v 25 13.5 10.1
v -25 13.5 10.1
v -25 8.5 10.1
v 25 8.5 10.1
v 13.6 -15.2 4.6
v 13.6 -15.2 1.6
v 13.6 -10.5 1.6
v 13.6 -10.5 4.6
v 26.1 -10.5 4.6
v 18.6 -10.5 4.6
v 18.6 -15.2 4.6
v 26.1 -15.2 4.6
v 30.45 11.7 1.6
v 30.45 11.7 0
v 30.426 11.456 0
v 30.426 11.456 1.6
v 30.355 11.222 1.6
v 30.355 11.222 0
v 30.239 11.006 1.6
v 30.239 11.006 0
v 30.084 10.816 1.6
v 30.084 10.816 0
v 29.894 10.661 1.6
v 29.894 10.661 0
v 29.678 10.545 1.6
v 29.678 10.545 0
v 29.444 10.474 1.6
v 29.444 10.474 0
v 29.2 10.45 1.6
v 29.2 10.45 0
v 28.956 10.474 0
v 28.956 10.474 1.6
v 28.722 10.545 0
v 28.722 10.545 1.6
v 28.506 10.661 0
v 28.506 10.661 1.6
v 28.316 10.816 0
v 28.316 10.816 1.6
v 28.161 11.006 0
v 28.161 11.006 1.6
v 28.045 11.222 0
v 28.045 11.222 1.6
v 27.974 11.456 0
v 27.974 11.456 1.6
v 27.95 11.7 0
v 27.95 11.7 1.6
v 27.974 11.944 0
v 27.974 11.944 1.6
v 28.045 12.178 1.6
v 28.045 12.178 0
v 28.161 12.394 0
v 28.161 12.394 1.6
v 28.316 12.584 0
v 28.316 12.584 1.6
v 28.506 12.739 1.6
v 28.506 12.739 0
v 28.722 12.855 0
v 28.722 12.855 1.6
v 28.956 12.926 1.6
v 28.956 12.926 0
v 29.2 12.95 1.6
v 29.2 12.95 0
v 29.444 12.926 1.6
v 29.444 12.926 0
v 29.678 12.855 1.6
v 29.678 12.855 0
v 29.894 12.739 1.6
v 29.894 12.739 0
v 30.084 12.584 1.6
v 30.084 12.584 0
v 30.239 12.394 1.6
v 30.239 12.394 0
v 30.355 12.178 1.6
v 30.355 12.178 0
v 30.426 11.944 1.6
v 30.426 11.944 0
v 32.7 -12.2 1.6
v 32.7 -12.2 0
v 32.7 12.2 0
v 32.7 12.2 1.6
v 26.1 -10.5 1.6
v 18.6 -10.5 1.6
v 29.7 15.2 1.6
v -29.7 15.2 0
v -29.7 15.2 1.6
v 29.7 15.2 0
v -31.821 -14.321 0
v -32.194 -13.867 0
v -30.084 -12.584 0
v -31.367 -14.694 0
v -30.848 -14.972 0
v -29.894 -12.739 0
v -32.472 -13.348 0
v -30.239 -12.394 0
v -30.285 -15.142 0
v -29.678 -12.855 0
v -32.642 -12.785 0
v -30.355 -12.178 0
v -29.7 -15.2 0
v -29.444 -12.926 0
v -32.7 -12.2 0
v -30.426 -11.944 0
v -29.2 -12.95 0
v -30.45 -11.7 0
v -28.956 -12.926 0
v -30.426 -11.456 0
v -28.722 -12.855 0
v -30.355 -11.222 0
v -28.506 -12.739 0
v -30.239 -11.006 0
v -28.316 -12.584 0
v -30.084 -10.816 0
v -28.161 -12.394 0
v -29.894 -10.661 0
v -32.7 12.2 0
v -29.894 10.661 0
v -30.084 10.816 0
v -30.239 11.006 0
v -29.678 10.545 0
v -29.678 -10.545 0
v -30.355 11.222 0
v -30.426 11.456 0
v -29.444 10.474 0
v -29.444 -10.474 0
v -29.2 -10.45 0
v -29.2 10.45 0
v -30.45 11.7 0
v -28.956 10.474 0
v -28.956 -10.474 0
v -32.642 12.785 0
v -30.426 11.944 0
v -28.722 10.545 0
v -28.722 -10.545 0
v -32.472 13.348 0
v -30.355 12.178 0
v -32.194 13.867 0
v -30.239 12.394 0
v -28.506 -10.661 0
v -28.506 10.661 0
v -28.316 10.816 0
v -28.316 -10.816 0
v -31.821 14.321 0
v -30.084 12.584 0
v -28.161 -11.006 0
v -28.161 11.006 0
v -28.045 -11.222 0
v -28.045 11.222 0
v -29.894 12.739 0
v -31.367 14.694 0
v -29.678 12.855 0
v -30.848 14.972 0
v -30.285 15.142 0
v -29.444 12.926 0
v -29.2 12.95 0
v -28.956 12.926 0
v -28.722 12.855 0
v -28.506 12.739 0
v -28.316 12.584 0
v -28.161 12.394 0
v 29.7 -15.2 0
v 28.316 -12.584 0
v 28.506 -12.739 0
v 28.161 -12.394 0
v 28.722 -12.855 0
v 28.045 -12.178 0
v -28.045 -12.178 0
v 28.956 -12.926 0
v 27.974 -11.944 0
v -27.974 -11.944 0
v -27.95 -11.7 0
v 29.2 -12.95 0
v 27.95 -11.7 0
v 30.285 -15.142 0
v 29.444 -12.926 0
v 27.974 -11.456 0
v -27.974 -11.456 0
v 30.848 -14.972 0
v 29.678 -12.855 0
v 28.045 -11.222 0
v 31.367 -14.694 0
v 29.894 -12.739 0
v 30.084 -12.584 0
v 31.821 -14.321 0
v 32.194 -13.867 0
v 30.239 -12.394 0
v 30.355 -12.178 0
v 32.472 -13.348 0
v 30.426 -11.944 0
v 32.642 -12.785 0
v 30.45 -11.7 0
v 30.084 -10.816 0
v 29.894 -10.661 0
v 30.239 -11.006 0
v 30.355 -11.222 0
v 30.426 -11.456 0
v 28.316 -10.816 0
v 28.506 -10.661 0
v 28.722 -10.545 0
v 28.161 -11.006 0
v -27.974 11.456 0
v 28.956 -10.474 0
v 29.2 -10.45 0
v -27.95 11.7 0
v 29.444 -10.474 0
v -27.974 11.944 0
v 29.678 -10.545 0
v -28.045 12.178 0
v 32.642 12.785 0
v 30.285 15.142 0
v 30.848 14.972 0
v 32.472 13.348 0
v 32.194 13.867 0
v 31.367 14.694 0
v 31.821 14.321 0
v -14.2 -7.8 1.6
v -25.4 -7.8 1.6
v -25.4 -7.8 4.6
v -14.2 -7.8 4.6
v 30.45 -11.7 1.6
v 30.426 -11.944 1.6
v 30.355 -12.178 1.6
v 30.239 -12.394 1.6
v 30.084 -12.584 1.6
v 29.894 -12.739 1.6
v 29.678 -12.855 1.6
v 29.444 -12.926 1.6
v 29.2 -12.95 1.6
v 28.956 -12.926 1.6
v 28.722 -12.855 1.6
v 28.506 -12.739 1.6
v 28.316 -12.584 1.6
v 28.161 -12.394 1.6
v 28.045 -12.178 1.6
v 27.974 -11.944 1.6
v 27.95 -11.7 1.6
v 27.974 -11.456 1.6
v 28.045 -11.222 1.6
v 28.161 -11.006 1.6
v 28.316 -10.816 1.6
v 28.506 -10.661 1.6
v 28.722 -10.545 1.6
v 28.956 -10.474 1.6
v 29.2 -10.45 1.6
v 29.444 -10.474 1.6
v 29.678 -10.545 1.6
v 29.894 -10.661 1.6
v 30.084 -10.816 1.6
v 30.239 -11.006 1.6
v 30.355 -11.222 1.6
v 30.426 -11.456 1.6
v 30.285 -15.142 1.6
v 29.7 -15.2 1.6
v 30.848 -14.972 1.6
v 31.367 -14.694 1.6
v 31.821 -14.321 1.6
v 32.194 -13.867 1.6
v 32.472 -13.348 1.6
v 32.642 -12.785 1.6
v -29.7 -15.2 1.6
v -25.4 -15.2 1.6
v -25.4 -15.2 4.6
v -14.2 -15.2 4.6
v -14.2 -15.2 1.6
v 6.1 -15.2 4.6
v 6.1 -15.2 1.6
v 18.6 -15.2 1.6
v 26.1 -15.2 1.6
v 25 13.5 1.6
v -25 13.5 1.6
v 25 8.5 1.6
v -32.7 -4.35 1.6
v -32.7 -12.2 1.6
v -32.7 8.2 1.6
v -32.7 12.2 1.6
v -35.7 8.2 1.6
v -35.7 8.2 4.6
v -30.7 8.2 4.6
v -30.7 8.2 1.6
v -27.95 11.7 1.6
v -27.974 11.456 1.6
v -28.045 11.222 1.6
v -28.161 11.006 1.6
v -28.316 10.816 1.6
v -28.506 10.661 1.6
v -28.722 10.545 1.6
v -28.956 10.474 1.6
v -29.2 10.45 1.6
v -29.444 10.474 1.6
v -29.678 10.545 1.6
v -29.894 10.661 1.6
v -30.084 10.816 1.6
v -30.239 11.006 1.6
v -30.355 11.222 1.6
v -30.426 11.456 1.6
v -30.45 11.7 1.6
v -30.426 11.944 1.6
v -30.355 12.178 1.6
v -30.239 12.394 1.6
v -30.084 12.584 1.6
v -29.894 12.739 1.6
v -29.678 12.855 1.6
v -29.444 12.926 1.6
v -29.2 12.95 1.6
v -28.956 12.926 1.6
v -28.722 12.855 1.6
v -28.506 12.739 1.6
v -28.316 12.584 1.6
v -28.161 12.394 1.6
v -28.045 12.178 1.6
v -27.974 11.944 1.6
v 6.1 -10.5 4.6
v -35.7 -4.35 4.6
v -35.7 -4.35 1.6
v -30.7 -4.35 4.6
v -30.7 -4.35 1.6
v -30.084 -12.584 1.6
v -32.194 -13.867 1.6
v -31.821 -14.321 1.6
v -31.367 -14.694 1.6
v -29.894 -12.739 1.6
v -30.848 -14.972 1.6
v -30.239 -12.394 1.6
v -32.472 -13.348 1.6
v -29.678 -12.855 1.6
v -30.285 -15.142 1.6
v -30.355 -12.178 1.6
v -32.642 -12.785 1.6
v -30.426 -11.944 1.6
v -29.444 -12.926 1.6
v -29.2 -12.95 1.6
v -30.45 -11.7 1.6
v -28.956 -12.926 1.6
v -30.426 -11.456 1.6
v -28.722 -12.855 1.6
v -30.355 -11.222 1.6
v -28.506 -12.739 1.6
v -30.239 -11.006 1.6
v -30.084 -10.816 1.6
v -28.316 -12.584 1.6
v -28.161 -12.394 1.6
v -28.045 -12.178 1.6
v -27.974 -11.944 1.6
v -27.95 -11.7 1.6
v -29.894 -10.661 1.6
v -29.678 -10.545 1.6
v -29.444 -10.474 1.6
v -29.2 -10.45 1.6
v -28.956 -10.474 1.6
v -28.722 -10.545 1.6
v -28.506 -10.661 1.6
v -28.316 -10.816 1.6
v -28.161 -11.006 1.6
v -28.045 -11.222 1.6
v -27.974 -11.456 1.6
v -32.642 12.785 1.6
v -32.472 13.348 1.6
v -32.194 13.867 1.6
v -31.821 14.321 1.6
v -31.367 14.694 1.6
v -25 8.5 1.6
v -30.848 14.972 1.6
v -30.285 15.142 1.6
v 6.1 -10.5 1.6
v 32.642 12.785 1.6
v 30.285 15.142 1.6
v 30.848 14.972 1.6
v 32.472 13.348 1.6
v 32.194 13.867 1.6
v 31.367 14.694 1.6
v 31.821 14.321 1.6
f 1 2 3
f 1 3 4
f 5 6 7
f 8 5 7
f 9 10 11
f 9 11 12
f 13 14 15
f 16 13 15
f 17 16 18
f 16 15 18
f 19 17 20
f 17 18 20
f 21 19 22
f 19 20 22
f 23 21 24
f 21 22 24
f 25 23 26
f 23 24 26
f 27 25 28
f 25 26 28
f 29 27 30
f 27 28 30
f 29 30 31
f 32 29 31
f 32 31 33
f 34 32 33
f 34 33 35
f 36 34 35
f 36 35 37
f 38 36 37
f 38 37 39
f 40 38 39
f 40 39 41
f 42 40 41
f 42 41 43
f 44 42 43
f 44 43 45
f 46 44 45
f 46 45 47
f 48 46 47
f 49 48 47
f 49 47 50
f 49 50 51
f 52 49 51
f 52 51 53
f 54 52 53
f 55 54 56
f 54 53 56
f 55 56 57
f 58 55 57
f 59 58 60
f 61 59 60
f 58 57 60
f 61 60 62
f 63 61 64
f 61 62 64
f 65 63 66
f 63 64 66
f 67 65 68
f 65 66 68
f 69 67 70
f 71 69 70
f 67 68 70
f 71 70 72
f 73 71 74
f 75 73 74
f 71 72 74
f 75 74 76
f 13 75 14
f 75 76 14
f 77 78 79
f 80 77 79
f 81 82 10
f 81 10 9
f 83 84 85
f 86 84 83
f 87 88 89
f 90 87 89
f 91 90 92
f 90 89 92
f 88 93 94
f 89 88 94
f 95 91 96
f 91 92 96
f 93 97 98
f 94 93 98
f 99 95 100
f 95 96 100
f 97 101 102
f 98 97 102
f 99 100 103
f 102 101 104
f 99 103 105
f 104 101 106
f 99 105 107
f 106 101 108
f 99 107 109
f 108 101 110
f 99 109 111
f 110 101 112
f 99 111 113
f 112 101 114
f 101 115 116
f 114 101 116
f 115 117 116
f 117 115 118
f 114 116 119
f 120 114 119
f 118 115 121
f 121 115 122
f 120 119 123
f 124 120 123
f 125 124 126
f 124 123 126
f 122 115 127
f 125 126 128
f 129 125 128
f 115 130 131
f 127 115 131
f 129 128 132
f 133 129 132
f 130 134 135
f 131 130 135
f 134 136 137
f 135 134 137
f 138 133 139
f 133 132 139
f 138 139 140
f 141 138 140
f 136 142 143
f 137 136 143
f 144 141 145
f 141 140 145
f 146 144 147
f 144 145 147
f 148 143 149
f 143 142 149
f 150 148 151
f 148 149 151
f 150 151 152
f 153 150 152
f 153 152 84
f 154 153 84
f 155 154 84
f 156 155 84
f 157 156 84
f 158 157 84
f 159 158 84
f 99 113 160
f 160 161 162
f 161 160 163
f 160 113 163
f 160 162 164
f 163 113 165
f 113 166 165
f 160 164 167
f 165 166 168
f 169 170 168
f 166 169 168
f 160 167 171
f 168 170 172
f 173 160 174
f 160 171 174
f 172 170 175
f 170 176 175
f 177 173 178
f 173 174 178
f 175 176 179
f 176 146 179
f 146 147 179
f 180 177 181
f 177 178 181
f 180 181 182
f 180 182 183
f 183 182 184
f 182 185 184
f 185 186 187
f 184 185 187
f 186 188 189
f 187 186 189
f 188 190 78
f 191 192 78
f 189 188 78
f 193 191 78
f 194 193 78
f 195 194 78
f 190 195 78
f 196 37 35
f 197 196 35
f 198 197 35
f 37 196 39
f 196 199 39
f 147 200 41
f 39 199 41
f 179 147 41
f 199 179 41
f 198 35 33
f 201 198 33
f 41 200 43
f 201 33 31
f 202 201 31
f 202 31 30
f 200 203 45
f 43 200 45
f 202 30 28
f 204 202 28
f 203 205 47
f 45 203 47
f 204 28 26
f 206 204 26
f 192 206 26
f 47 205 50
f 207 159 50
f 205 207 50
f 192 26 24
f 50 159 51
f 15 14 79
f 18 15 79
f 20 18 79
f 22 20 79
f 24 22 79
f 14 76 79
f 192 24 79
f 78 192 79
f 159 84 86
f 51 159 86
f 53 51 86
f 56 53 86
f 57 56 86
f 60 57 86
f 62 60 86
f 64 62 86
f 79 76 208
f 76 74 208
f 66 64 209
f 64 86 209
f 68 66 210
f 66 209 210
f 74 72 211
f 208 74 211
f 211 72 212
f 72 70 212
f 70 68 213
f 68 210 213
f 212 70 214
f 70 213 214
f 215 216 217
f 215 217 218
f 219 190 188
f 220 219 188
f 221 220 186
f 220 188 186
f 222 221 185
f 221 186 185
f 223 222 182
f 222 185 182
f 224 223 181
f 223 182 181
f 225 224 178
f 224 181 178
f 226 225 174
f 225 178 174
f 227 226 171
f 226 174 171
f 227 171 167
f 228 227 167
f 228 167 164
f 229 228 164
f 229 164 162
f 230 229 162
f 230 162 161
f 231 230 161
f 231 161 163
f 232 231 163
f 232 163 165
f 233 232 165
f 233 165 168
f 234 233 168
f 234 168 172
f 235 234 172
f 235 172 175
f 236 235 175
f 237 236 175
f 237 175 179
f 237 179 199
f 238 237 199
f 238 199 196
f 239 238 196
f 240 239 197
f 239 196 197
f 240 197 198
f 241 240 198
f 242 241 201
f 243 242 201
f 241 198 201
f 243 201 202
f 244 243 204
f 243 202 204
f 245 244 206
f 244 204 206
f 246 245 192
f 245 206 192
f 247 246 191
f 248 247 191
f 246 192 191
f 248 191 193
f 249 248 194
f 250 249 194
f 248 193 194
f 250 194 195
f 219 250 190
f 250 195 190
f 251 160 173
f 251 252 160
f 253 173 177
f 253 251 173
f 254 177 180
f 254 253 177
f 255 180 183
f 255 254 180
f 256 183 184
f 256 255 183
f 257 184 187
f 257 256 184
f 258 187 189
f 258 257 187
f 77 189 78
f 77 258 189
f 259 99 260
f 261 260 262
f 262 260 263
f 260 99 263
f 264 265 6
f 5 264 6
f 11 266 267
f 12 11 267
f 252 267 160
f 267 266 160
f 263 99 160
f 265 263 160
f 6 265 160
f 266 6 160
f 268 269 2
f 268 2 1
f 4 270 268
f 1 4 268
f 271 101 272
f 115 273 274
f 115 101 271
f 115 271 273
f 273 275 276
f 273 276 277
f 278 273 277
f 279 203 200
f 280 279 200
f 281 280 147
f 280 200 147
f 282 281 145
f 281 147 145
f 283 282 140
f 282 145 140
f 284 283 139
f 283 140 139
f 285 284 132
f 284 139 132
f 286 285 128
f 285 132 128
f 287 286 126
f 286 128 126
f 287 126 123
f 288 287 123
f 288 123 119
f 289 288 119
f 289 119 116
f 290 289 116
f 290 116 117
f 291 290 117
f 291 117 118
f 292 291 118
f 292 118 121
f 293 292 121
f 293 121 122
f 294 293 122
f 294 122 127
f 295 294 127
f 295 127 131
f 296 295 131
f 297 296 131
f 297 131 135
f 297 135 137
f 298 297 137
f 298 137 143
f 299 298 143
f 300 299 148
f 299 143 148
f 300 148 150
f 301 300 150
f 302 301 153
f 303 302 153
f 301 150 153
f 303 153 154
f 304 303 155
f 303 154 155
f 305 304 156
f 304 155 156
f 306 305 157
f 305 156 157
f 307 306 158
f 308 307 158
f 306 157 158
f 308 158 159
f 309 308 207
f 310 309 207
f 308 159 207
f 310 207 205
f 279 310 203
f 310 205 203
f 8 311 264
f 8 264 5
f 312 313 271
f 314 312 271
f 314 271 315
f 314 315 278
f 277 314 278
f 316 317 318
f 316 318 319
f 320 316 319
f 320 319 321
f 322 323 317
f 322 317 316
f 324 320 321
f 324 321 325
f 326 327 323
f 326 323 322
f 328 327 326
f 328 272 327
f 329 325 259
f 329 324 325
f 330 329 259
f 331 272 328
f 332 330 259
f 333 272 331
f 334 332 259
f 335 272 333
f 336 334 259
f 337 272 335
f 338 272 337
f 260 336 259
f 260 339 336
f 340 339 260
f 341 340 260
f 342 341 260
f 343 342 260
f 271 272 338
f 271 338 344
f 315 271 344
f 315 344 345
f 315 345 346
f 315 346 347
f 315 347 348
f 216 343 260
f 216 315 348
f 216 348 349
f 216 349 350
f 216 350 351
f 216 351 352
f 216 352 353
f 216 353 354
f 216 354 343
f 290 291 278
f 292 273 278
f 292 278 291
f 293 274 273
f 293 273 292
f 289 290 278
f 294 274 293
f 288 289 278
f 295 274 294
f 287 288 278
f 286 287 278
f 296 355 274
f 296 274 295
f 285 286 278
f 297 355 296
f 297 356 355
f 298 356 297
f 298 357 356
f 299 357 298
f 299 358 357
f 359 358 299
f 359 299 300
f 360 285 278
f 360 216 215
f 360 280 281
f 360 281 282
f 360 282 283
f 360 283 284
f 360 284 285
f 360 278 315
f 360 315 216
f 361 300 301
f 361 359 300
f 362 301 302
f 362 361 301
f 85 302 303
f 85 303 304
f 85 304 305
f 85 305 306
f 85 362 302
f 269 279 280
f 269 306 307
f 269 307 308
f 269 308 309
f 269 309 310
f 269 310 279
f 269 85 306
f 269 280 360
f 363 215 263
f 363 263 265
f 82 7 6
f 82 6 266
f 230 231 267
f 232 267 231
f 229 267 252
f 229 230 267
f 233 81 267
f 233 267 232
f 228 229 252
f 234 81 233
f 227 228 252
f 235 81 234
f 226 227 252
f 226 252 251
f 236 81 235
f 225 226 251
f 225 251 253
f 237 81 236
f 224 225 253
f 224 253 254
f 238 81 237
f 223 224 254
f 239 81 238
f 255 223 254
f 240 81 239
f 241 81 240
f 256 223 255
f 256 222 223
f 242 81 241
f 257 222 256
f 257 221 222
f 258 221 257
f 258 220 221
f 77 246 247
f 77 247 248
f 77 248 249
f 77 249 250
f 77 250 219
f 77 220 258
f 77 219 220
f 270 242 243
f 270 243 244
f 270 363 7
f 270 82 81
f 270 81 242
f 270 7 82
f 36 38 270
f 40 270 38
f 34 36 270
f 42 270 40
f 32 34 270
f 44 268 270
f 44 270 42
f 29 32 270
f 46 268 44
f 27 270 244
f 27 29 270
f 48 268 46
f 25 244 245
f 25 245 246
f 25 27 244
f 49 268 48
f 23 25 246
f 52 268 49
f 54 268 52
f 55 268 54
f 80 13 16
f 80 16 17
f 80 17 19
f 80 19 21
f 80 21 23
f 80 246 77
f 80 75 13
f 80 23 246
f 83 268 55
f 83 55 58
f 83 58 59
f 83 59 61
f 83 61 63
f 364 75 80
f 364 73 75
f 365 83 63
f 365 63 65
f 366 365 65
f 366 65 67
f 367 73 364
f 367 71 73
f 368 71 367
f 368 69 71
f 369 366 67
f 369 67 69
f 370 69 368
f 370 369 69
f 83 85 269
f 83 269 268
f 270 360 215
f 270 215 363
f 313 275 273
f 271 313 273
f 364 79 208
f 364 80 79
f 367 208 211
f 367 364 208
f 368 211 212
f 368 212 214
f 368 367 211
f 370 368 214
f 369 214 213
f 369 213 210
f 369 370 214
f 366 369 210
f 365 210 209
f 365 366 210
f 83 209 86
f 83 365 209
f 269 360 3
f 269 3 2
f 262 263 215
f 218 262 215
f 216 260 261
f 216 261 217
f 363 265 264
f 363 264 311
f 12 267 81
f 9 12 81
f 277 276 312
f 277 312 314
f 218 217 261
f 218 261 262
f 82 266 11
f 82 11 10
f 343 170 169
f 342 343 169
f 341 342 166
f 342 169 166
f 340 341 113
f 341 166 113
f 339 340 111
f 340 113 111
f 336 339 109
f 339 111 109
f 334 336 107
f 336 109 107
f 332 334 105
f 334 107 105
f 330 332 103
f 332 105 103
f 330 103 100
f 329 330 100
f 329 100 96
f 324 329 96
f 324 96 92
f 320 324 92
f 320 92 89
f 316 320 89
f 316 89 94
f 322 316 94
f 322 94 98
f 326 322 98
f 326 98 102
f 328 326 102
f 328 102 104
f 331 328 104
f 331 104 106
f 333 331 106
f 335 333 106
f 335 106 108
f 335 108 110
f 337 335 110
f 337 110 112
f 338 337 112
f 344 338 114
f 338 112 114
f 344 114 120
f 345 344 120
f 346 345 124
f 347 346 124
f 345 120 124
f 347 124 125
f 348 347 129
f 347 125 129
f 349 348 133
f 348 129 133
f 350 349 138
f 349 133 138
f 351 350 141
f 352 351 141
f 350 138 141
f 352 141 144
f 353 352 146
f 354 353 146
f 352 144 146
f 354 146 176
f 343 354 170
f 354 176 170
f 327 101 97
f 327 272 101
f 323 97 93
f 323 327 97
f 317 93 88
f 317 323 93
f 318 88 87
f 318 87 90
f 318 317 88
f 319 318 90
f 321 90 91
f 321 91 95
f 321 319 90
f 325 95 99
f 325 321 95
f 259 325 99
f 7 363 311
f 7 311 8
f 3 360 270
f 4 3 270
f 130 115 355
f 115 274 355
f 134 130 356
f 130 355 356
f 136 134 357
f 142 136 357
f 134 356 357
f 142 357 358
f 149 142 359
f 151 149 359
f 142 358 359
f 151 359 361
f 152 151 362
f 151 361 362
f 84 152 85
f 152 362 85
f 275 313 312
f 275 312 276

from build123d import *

# Parameters (mm, degrees)
SKETCH_W      = 65.4
SKETCH_H      = 30.4
PAD_DEPTH     = 1.6
FILLET_R      = 3
SKETCH001_W   = 7.5
SKETCH001_H   = 4.7
SKETCH001_W_2 = 5
SKETCH001_H_2 = 12.55
SKETCH001_W_3 = 11.2
SKETCH001_H_3 = 7.4
PAD001_DEPTH  = 3
SKETCH002_R   = 1.25
POCKET_DEPTH  = 5
SKETCH003_W   = 50
SKETCH003_H   = 5
PAD002_DEPTH  = 8.5


with BuildPart() as part:
    # Sketch → Pad (new body)
    with BuildSketch(Plane.XY):
        Rectangle(SKETCH_W, SKETCH_H)
    extrude(amount=PAD_DEPTH)

    # Fillet
    fillet_edges = [part.edges().sort_by_distance(p)[0] for p in [
        (32.7, -15.2, 0.8),
        (-32.7, -15.2, 0.8),
        (-32.7, 15.2, 0.8),
        (32.7, 15.2, 0.8),
    ]]
    fillet(fillet_edges, radius=FILLET_R)

    # Sketch001 (on Face5 of Fillet) → Pad001 (join)
    with BuildSketch(Plane.XY.offset(1.6)):
        with Locations((9.85, -12.85)):
            Rectangle(SKETCH001_W, SKETCH001_H)
        with Locations((22.35, -12.85)):
            Rectangle(SKETCH001_W, SKETCH001_H)
        with Locations((-33.2, 1.925)):
            Rectangle(SKETCH001_W_2, SKETCH001_H_2)
        with Locations((-19.8, -11.5)):
            Rectangle(SKETCH001_W_3, SKETCH001_H_3)
    extrude(amount=PAD001_DEPTH)

    # Sketch002 (on Face2 of Pad001) → Pocket (cut)
    with BuildSketch(Plane(origin=(0, 0, 0), x_dir=(1, 0, 0), z_dir=(0, 0, -1))):
        with Locations((-29.2, 11.7)):
            Circle(SKETCH002_R)
        with Locations((29.2, -11.7)):
            Circle(SKETCH002_R)
        with Locations((29.2, 11.7)):
            Circle(SKETCH002_R)
        with Locations((-29.2, -11.7)):
            Circle(SKETCH002_R)
    extrude(amount=-POCKET_DEPTH, mode=Mode.SUBTRACT)

    # Sketch003 (on Face5 of Pocket) → Pad002 (join)
    with BuildSketch(Plane.XY.offset(1.6)):
        with Locations((0, 11)):
            Rectangle(SKETCH003_W, SKETCH003_H)
    extrude(amount=PAD002_DEPTH)


solid = part.part
